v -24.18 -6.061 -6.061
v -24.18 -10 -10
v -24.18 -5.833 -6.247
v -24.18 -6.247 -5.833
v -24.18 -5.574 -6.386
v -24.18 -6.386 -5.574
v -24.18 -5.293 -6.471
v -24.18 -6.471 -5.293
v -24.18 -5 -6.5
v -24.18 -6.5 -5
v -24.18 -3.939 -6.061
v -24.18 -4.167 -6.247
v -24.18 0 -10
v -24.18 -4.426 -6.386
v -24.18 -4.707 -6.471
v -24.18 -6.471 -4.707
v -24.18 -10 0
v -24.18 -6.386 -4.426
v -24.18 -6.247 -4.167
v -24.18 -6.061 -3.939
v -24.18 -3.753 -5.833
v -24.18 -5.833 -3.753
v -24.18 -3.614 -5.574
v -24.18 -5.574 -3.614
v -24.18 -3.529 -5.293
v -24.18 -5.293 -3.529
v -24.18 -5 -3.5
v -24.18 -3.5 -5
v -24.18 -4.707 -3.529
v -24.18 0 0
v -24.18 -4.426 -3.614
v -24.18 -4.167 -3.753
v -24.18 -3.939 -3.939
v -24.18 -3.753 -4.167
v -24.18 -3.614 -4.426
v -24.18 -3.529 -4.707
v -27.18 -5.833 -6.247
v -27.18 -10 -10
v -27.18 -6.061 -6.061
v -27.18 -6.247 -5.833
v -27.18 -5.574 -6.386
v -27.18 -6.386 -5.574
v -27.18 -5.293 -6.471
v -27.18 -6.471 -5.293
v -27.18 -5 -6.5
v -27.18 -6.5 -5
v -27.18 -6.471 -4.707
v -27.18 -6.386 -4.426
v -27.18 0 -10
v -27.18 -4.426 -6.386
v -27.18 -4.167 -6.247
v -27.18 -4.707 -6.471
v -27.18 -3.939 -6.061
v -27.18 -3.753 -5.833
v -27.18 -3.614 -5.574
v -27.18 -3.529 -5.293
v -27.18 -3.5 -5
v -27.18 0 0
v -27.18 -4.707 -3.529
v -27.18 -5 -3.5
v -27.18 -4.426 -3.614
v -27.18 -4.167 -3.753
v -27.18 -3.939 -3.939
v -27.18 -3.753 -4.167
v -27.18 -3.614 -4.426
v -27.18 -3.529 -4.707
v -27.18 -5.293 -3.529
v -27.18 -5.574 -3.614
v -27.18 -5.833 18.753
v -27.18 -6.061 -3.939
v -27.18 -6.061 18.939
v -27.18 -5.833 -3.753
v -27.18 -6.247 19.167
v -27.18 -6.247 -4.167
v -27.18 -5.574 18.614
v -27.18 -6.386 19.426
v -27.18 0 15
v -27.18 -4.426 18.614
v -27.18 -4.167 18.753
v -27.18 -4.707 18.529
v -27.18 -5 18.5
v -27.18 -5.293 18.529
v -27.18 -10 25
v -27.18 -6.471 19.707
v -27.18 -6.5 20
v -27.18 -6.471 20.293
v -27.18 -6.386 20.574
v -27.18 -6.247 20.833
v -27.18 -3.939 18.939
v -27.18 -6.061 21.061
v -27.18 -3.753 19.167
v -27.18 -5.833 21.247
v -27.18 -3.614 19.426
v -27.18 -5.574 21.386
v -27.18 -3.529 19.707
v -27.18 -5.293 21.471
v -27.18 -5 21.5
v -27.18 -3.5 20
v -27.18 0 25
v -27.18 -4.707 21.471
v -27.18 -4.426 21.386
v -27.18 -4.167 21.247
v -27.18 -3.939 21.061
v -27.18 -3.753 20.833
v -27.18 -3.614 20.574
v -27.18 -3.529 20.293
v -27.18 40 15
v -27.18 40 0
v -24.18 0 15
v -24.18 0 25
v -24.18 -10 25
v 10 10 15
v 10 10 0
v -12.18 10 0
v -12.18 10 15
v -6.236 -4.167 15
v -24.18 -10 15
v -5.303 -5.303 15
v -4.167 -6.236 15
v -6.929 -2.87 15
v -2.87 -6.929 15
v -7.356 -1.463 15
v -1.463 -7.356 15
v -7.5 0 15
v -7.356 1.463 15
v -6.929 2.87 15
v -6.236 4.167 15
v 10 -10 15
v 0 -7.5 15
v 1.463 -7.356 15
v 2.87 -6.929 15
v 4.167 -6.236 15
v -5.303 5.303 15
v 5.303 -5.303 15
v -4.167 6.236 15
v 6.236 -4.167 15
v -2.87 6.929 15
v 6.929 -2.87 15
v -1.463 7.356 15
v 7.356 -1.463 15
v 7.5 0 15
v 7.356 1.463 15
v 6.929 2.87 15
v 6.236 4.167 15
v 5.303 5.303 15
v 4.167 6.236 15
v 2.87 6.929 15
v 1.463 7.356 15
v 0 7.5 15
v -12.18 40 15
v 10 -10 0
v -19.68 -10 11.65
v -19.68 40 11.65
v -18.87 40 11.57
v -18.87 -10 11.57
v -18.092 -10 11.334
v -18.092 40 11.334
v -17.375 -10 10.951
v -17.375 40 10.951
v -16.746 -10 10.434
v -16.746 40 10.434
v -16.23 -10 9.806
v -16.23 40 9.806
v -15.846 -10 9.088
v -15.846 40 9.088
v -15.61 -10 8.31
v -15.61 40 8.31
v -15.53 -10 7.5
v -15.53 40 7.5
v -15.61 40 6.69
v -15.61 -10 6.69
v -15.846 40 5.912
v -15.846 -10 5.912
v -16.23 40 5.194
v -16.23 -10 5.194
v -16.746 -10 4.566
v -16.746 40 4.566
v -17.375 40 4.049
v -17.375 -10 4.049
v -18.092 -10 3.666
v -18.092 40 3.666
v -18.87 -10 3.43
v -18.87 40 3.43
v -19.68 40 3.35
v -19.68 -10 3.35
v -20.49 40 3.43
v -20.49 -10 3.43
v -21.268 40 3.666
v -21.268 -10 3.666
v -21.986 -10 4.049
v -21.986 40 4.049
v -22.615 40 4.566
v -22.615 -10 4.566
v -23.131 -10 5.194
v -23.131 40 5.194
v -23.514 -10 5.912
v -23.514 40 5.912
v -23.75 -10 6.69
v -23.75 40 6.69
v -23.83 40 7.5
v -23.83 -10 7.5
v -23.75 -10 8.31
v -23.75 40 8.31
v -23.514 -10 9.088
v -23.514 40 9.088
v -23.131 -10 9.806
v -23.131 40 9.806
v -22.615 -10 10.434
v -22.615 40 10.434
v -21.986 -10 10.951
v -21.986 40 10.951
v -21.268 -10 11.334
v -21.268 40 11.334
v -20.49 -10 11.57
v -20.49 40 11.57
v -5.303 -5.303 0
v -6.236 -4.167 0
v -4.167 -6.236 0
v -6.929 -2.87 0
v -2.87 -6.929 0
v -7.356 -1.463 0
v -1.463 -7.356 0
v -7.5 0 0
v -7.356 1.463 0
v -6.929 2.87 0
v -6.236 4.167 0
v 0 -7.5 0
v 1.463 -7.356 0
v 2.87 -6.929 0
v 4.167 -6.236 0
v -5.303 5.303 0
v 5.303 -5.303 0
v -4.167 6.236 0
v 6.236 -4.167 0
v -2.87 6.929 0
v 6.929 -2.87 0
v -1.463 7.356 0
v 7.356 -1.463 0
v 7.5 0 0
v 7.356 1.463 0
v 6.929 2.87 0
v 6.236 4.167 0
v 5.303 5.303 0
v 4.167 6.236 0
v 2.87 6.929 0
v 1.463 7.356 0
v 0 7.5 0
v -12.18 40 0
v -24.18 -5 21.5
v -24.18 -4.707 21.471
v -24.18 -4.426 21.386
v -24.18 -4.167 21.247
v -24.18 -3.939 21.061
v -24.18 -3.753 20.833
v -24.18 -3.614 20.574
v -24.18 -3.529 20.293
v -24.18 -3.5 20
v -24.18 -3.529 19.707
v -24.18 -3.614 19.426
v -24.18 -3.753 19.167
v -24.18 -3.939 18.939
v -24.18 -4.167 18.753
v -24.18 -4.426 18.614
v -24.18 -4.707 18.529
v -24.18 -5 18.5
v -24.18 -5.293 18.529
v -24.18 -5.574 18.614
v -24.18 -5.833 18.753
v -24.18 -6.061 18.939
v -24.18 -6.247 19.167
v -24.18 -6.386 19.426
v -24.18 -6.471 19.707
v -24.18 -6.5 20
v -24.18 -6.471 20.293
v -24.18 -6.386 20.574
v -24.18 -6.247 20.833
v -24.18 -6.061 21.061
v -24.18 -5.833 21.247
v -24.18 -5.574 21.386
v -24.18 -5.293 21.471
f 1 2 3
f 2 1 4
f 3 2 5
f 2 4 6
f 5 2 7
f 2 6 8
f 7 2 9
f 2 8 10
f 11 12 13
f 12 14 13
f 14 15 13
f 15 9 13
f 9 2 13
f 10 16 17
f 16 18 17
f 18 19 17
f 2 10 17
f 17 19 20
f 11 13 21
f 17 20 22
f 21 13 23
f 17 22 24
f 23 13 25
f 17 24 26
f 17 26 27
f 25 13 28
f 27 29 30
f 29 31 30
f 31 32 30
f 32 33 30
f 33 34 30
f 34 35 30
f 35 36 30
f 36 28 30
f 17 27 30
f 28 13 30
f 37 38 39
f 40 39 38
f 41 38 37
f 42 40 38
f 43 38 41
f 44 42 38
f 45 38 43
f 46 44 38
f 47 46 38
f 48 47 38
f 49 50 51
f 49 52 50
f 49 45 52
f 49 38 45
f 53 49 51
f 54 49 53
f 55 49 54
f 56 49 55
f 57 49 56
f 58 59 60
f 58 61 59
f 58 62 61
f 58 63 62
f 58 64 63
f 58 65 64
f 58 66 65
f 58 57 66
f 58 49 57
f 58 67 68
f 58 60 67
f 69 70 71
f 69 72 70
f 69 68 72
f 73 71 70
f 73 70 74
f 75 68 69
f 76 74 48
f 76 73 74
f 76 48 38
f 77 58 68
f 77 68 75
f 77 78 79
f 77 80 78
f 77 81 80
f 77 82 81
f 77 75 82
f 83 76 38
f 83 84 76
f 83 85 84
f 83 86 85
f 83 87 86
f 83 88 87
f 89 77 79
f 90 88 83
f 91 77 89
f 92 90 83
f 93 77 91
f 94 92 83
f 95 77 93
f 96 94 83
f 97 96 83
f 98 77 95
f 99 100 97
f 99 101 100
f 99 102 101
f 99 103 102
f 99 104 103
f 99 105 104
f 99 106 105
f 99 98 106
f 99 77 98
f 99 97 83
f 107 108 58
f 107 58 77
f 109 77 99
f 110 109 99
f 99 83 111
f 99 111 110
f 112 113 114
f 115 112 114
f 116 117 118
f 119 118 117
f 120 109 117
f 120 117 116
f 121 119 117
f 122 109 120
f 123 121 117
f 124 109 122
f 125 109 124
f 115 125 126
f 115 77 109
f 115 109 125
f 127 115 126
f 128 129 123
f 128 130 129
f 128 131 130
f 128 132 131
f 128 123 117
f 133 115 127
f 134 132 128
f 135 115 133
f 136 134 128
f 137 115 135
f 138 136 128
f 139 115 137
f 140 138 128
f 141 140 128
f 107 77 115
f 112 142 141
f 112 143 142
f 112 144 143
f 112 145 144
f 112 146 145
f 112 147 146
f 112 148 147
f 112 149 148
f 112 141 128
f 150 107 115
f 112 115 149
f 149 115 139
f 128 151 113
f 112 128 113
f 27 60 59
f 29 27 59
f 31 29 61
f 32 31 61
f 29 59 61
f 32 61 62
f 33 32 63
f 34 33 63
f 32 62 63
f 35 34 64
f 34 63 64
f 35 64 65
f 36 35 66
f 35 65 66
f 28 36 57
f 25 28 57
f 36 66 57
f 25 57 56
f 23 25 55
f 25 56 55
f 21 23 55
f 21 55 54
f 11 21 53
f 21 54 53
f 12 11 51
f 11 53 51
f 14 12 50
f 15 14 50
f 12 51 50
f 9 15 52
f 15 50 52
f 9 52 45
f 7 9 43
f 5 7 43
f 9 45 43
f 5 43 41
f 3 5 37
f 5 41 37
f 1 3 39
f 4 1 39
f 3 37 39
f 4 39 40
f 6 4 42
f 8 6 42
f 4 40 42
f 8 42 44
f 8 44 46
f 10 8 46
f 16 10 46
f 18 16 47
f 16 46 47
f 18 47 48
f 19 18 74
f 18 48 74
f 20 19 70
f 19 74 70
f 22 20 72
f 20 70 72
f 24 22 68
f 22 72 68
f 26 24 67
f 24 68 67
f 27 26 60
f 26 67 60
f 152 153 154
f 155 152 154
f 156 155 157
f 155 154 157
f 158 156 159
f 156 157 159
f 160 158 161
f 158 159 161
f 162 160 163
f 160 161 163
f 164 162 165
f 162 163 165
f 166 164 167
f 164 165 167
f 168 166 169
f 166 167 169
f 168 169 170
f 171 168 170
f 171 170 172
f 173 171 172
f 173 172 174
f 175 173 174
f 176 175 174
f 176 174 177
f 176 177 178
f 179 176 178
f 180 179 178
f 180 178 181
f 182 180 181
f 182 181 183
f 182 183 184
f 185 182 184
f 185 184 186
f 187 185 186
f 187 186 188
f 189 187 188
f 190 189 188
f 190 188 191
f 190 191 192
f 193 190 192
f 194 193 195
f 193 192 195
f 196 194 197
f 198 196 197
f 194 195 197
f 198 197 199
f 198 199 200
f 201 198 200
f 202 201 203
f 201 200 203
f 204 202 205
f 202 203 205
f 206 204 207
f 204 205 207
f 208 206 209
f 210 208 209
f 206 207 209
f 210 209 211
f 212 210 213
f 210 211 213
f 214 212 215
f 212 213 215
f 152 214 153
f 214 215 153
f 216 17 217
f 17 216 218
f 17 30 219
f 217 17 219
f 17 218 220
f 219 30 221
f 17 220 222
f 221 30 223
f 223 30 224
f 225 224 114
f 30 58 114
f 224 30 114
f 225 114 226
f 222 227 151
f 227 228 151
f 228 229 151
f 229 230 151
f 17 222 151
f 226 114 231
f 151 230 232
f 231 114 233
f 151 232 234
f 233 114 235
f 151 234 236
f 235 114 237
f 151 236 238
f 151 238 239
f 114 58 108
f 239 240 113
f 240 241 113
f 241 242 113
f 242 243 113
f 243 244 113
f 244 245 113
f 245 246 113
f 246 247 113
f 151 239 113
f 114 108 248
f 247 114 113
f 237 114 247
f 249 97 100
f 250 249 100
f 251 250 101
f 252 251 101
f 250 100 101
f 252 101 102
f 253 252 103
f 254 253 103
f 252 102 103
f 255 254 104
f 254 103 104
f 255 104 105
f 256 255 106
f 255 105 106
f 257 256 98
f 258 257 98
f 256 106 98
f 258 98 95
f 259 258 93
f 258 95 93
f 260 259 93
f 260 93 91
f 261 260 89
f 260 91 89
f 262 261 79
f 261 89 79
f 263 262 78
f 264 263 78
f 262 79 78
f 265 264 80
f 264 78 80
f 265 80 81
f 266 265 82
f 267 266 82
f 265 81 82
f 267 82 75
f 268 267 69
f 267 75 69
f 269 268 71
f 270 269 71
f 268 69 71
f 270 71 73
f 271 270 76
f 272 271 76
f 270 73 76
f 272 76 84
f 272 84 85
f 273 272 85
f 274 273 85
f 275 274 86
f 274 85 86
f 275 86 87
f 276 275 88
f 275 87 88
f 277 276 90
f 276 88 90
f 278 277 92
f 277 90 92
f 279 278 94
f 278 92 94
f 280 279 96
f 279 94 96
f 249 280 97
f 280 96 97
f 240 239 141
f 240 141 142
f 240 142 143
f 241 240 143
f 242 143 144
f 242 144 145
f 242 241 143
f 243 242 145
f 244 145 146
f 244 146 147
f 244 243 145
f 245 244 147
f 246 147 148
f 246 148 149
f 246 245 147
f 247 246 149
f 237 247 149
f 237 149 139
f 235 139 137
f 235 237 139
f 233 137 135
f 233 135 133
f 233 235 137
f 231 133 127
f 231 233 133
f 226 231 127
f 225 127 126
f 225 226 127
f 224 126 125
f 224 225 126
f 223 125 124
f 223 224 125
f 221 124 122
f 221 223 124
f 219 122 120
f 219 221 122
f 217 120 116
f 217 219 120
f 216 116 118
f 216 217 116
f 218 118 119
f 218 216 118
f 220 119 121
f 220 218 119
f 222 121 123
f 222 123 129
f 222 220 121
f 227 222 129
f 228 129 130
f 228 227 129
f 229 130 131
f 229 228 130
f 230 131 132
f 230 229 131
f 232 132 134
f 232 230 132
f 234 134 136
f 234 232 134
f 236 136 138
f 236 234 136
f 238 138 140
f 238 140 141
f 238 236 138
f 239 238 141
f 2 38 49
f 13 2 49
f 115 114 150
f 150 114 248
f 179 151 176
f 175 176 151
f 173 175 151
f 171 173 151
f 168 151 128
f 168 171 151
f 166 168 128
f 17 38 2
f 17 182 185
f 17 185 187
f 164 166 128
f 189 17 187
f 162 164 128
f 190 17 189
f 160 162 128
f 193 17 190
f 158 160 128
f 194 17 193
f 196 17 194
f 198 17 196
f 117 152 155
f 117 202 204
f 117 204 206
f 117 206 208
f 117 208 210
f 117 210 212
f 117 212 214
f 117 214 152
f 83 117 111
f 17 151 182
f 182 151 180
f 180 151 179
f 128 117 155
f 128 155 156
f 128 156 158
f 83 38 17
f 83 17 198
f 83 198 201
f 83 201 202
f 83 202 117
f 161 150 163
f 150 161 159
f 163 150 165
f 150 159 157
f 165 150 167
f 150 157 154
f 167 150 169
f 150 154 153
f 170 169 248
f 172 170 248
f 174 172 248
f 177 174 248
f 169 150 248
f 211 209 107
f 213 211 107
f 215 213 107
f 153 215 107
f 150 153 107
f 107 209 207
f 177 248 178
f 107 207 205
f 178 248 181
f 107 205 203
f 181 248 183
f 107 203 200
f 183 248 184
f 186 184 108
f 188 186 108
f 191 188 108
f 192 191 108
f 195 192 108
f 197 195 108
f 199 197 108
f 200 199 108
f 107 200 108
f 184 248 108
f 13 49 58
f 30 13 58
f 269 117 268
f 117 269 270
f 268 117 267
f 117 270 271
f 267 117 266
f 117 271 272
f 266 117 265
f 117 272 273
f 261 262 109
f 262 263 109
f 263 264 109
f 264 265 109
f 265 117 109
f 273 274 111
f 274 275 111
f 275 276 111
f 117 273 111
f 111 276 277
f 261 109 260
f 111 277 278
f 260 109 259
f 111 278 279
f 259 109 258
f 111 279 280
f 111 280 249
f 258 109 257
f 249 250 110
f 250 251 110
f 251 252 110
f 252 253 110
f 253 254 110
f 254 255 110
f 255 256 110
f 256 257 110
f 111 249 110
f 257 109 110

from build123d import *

# Parameters (mm, degrees)
SKETCH1_R           = 7.5
BOSS_EXTRUDE1_DEPTH = 15
SKETCH2_R           = 4.15
CUT_EXTRUDE1_DEPTH  = 59.853707622
SKETCH3_W           = 35
SKETCH3_H           = 10
SKETCH3_R           = 1.5
BOSS_EXTRUDE2_DEPTH = 3


with BuildPart() as part:
    # Sketch1 → Boss-Extrude1 (new body)
    with BuildSketch(Plane.XY):
        Polygon((-12.180119589, 10), (-12.180119589, 40), (-27.180119589, 40), (-27.180119589, -10), (10, -10), (10, 10), align=None)
        Circle(SKETCH1_R, mode=Mode.SUBTRACT)
    extrude(amount=BOSS_EXTRUDE1_DEPTH)

    # Sketch2 → Cut-Extrude1 (cut, through all)
    with BuildSketch(Plane(origin=(0, 40, 0), x_dir=(1, 0, 0), z_dir=(0, 1, 0))):
        with Locations(Location((-19.680119589, -7.5, 0), (0, 0, 270))):
            Circle(SKETCH2_R)
    extrude(amount=-CUT_EXTRUDE1_DEPTH, mode=Mode.SUBTRACT)

    # Sketch3 → Boss-Extrude2 (add)
    with BuildSketch(Plane.ZY.offset(27.180119589)):
        with Locations((7.5, -5)):
            Rectangle(SKETCH3_W, SKETCH3_H)
        with Locations((-5, -5)):
            Circle(SKETCH3_R, mode=Mode.SUBTRACT)
        with Locations((20, -5)):
            Circle(SKETCH3_R, mode=Mode.SUBTRACT)
    extrude(amount=-BOSS_EXTRUDE2_DEPTH)


solid = part.part
